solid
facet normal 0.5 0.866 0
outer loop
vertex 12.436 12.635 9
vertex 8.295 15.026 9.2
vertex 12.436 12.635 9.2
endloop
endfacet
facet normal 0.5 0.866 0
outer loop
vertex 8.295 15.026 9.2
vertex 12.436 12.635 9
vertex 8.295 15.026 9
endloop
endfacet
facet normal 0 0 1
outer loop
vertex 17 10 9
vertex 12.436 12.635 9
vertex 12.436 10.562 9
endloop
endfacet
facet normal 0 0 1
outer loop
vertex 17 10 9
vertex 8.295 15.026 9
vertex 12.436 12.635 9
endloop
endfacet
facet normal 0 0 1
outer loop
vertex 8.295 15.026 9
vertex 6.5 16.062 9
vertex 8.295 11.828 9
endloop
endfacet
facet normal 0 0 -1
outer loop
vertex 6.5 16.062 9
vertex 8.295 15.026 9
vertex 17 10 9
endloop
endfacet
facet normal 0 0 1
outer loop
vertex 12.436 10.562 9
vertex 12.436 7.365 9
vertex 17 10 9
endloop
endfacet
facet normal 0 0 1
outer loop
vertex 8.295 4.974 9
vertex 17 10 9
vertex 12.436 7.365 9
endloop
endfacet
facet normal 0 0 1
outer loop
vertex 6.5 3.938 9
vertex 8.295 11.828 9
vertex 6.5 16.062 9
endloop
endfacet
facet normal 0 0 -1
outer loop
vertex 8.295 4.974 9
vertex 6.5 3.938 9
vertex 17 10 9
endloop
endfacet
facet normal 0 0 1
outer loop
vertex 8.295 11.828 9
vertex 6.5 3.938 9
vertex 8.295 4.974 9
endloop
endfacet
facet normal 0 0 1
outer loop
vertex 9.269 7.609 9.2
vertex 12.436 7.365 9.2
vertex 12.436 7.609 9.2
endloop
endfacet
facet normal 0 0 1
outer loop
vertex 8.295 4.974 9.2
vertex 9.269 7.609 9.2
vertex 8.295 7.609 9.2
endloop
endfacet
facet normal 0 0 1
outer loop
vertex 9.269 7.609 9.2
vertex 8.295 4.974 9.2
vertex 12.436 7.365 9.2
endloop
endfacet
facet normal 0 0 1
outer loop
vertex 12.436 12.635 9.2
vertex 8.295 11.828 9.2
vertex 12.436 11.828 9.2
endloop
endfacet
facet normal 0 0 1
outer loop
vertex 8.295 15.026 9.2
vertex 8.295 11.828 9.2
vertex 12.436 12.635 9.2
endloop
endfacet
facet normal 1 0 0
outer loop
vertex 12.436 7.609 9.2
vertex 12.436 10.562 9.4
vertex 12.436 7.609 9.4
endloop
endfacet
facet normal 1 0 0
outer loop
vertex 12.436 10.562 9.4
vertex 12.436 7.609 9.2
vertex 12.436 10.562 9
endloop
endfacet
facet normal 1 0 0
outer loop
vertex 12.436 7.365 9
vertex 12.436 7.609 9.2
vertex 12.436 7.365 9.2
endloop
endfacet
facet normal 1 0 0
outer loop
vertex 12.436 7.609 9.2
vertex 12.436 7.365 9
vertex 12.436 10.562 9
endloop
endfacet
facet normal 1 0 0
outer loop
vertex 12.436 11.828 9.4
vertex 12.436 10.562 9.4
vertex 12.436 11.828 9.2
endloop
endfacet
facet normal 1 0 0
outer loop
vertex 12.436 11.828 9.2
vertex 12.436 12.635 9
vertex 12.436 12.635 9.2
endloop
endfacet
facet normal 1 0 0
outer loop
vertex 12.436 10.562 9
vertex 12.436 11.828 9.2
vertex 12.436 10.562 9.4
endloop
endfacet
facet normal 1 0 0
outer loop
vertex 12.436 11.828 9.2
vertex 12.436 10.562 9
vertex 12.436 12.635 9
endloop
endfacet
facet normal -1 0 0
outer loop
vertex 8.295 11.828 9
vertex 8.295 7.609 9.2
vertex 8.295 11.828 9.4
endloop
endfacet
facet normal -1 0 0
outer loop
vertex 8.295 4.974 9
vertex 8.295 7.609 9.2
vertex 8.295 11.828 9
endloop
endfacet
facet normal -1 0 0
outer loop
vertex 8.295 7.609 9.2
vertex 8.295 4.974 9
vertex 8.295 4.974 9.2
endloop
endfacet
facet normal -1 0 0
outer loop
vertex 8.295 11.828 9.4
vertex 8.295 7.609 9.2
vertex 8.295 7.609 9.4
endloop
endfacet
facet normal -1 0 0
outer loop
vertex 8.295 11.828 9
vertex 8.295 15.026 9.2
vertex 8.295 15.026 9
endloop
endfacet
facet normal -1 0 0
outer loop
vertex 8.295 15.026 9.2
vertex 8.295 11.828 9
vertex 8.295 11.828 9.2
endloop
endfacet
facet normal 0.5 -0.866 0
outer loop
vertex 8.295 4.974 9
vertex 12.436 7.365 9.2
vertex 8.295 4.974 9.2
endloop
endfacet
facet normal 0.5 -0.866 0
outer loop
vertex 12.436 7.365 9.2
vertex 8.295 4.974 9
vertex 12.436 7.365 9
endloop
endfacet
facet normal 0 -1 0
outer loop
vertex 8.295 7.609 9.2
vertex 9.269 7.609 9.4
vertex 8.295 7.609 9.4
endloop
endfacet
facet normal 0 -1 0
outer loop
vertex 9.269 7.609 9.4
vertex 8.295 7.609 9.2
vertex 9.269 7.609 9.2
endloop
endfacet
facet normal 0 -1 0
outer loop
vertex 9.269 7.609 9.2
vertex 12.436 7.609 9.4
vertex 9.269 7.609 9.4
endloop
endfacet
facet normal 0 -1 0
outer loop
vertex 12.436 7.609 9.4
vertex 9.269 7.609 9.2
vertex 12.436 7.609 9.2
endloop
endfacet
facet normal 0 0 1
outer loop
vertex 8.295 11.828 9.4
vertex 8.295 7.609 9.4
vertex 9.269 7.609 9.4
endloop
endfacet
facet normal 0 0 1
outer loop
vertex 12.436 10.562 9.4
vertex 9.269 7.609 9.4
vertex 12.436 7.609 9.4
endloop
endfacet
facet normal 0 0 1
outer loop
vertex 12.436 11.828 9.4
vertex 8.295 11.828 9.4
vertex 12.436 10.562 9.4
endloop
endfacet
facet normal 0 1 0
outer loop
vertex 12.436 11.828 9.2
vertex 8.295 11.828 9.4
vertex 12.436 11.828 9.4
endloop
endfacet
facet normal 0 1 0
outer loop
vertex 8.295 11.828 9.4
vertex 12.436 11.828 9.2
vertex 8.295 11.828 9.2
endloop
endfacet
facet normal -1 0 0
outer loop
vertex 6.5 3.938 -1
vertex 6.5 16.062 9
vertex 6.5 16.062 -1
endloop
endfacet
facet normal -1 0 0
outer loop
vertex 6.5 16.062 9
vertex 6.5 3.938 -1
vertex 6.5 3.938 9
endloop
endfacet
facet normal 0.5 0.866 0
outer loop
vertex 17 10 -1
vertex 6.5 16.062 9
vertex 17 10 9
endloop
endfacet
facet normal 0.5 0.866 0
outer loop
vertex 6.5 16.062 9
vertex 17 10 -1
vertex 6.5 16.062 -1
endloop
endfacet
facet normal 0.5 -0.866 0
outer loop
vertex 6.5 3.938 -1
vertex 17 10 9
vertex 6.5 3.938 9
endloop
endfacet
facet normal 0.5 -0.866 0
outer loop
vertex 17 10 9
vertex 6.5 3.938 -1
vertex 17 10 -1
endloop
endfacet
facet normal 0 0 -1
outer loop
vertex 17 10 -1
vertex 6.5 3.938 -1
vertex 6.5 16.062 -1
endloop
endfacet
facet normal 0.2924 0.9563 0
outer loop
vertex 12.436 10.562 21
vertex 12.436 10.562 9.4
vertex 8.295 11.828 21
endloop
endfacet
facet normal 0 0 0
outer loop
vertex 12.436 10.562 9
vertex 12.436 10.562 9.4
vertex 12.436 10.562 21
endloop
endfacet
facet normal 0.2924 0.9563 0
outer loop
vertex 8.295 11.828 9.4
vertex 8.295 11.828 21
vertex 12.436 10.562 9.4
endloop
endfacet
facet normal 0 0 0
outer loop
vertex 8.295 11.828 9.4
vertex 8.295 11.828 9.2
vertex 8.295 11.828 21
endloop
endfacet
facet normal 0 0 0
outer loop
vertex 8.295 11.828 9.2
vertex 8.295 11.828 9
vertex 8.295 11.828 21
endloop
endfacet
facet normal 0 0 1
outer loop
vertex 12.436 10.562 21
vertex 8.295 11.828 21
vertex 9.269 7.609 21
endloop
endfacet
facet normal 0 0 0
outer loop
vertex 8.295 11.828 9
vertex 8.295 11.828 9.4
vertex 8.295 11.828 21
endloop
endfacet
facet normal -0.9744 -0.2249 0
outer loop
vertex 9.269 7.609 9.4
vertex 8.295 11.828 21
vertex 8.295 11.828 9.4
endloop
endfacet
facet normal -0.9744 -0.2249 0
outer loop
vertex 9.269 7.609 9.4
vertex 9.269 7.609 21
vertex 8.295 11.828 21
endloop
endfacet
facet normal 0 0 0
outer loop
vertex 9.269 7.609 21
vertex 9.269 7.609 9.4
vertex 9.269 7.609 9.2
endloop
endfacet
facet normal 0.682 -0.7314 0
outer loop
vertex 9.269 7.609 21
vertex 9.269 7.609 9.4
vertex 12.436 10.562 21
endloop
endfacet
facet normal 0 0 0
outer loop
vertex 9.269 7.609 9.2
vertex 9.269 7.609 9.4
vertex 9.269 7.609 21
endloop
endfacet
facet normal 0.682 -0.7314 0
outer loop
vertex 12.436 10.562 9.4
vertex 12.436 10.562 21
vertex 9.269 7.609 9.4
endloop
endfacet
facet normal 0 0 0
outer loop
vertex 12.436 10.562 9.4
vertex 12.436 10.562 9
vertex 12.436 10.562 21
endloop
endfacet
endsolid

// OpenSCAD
include <common.scad>

// Prusa-style hole bridging, for printing downfacing screw holes without
// supports, see https://www.youtube.com/watch?v=W8FbHTcB05w.
// Needs two children:
//   1. 2D outer shape, for example the shape of the screw head
//   2. 2D inner shape, for example the shape of the screw axle
// Shapes can be non-circular (see the example below).
module prusa_hole_bridging(layer_height=0.2) {
    assert($children == 2, "prusa_hole_bridging needs exactly two children");

    module first_bridge_2d() {
        intersection() {
            minkowski() {
                children(1);
                square([min_value, max_value], center=true);
            }
            children(0);
        }
    }
    module second_bridge_2d() {
        intersection() {
            minkowski() {
                children(1);
                square([max_value, min_value], center=true);
            }
            first_bridge_2d() {
                children(0);
                children(1);
            }
        }
    }

    linear_extrude(layer_height) {
        first_bridge_2d() {
            children(0);
            children(1);
        }
    }
    linear_extrude(2 * layer_height) {
        second_bridge_2d() {
            children(0);
            children(1);
        }
    }
}

// example using triangle-shaped screw parts for demonstration
cube_l = 20;
screw_l = 10;
screw_head_d = 14;
screw_axle_d = 5;

difference() {
    %cube(cube_l);
    translate([cube_l/2, cube_l/2, -1]) {
        // this be our screw
        cylinder(d=screw_head_d, $fn=3, h=screw_l);
        rotate([0, 0, 13]) {
            cylinder(d=screw_axle_d, h=cube_l + 2, $fn=3);
        }
        
        // the bridging section
        translate([0, 0, screw_l]) {
            prusa_hole_bridging() {
                circle(d=screw_head_d, $fn=3);
                rotate([0, 0, 13]) {
                    circle(d=screw_axle_d, $fn=3);
                }
            }
        }
    }
}
